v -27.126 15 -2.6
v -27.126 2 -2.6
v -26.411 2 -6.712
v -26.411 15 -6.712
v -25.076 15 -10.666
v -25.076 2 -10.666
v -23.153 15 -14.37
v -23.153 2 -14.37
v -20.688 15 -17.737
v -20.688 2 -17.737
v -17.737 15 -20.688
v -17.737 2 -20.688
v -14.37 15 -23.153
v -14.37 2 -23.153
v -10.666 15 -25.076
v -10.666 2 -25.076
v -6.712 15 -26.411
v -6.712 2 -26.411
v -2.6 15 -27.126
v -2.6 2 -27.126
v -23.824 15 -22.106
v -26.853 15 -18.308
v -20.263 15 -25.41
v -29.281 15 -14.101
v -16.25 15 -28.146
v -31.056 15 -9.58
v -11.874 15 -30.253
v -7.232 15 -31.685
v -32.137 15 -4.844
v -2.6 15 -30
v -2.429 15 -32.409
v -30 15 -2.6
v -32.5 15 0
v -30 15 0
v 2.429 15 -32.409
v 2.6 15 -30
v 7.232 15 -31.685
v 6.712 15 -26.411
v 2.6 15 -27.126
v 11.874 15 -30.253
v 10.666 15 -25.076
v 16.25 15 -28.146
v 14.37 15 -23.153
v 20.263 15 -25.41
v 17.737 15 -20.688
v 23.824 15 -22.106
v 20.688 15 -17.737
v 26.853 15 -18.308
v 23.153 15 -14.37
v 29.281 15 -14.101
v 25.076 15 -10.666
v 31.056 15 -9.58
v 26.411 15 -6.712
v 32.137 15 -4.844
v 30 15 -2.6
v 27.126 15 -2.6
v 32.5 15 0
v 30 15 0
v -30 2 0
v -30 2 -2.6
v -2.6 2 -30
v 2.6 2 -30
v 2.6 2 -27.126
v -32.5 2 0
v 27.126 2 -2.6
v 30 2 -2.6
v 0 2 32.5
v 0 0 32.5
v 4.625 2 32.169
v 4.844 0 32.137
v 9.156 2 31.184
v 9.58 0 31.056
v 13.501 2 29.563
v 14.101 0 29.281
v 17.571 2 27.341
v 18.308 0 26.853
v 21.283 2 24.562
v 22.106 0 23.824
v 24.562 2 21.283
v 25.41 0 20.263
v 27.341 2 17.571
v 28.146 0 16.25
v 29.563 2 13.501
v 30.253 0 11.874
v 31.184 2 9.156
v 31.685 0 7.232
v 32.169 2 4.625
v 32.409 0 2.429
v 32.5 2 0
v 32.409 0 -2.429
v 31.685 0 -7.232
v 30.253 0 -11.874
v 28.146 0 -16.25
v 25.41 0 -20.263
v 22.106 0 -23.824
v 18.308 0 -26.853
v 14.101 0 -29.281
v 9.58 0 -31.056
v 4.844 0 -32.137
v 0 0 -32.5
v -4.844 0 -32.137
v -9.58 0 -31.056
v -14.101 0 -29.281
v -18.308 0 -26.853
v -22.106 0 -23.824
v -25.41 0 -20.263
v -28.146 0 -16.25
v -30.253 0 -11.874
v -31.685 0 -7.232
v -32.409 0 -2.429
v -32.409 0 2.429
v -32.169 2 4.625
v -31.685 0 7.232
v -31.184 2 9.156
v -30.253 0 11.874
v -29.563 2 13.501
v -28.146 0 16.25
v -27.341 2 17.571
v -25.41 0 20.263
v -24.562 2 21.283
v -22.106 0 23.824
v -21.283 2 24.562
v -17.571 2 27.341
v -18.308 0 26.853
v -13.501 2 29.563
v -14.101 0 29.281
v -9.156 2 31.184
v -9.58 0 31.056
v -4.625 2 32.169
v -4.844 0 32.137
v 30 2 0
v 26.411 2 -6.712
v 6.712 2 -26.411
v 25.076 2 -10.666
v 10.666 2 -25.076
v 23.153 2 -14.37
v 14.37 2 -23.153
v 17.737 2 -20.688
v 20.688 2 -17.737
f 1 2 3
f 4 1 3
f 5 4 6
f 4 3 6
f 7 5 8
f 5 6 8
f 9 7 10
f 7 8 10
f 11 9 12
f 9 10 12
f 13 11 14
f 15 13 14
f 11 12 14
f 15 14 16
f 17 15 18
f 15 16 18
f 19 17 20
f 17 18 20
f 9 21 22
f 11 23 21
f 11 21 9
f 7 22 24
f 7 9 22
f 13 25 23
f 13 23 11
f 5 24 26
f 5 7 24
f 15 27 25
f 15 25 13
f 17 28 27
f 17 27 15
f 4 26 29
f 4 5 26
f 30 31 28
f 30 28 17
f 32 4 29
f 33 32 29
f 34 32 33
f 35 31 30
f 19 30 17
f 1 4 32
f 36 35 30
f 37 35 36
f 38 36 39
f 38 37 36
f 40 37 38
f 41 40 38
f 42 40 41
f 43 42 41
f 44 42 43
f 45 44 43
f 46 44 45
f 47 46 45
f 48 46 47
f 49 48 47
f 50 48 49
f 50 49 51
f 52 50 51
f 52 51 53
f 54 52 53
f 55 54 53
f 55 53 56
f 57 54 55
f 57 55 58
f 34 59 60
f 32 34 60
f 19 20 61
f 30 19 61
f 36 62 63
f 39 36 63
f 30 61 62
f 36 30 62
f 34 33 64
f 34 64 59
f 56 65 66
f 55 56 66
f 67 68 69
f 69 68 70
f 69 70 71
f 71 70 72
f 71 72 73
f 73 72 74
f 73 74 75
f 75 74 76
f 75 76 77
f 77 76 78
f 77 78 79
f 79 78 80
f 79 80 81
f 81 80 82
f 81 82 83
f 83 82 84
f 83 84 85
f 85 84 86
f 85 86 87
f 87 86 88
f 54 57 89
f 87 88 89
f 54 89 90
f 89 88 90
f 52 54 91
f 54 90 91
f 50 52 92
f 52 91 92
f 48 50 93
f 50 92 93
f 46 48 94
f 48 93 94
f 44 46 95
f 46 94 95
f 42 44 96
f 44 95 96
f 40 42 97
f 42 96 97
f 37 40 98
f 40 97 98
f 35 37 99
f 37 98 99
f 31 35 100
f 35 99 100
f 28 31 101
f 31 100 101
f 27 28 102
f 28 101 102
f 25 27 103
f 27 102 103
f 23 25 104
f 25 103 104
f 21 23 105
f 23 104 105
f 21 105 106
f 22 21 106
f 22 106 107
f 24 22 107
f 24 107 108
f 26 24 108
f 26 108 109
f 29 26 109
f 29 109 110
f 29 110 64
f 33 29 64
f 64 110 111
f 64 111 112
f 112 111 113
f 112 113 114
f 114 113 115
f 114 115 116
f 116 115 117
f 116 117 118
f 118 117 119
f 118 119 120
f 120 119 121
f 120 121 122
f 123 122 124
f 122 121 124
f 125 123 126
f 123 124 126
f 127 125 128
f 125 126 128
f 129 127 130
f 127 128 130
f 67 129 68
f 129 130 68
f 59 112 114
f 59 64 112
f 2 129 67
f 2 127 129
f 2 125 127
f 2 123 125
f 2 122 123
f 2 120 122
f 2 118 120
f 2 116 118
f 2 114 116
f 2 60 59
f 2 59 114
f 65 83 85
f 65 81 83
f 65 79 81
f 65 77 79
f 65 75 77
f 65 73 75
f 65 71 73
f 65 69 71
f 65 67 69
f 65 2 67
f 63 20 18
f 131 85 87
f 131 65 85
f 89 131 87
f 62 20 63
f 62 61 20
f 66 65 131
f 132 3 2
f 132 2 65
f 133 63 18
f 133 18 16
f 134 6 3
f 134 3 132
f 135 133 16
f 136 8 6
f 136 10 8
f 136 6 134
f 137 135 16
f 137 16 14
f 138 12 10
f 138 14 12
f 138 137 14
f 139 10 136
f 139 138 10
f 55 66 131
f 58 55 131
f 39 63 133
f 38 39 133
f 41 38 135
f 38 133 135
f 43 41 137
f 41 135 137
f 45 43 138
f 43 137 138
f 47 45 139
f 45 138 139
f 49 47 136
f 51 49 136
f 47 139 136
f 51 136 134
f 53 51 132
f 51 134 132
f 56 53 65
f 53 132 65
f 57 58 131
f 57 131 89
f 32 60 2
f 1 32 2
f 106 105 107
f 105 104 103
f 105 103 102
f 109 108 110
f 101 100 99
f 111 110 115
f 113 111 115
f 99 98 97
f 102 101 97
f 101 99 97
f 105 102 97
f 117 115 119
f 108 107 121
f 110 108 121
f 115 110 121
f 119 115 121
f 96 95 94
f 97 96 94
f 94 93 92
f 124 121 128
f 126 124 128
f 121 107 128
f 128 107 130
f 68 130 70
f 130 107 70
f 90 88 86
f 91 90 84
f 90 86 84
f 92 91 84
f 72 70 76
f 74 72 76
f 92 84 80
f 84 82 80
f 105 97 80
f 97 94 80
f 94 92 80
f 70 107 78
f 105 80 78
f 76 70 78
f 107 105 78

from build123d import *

# Parameters (mm, degrees)
SKETCH1_R           = 32.5
BOSS_EXTRUDE1_DEPTH = 2
SKETCH2_R           = 32.5
BOSS_EXTRUDE2_DEPTH = 13
SKETCH6_W           = 71.390071862
SKETCH6_H           = 35.774890597
CUT_EXTRUDE4_DEPTH  = 13


with BuildPart() as part:
    # Sketch1 → Boss-Extrude1 (new body)
    with BuildSketch(Plane(origin=(0, 0, 0), x_dir=(1, 0, 0), z_dir=(0, 1, 0))):
        with Locations(Location((0, 0, 0), (0, 0, 270))):
            Circle(SKETCH1_R)
    extrude(amount=BOSS_EXTRUDE1_DEPTH)

    # Sketch2 → Boss-Extrude2 (add)
    with BuildSketch(Plane(origin=(0, 2, 0), x_dir=(1, 0, 0), z_dir=(0, 1, 0))):
        with Locations(Location((0, 0, 0), (0, 0, 270))):
            Circle(SKETCH2_R)
        with BuildLine():
            Line((2.6, -27.125679715), (2.6, -30))
            Line((2.6, -30), (-2.6, -30))
            Line((-2.6, -30), (-2.6, -27.125679715))
            ThreePointArc((-2.6, -27.125679715), (-19.268659787, -19.268659787), (-27.125679715, -2.6))
            Line((-27.125679715, -2.6), (-30, -2.6))
            Line((-30, -2.6), (-30, 2.6))
            Line((-30, 2.6), (-27.125679715, 2.6))
            ThreePointArc((-27.125679715, 2.6), (-19.268659787, 19.268659787), (-2.6, 27.125679715))
            Line((-2.6, 27.125679715), (-2.6, 30))
            Line((-2.6, 30), (2.6, 30))
            Line((2.6, 30), (2.6, 27.125679715))
            ThreePointArc((2.6, 27.125679715), (19.268659787, 19.268659787), (27.125679715, 2.6))
            Line((27.125679715, 2.6), (30, 2.6))
            Line((30, 2.6), (30, -2.6))
            Line((30, -2.6), (27.125679715, -2.6))
            ThreePointArc((27.125679715, -2.6), (19.268659787, -19.268659787), (2.6, -27.125679715))
        make_face(mode=Mode.SUBTRACT)
    extrude(amount=BOSS_EXTRUDE2_DEPTH)

    # Sketch6 → Cut-Extrude4 (cut)
    with BuildSketch(Plane(origin=(0, 15, 0), x_dir=(1, 0, 0), z_dir=(0, 1, 0))):
        with Locations((0.159709333, -17.887445299)):
            Rectangle(SKETCH6_W, SKETCH6_H)
    extrude(amount=-CUT_EXTRUDE4_DEPTH, mode=Mode.SUBTRACT)


solid = part.part
